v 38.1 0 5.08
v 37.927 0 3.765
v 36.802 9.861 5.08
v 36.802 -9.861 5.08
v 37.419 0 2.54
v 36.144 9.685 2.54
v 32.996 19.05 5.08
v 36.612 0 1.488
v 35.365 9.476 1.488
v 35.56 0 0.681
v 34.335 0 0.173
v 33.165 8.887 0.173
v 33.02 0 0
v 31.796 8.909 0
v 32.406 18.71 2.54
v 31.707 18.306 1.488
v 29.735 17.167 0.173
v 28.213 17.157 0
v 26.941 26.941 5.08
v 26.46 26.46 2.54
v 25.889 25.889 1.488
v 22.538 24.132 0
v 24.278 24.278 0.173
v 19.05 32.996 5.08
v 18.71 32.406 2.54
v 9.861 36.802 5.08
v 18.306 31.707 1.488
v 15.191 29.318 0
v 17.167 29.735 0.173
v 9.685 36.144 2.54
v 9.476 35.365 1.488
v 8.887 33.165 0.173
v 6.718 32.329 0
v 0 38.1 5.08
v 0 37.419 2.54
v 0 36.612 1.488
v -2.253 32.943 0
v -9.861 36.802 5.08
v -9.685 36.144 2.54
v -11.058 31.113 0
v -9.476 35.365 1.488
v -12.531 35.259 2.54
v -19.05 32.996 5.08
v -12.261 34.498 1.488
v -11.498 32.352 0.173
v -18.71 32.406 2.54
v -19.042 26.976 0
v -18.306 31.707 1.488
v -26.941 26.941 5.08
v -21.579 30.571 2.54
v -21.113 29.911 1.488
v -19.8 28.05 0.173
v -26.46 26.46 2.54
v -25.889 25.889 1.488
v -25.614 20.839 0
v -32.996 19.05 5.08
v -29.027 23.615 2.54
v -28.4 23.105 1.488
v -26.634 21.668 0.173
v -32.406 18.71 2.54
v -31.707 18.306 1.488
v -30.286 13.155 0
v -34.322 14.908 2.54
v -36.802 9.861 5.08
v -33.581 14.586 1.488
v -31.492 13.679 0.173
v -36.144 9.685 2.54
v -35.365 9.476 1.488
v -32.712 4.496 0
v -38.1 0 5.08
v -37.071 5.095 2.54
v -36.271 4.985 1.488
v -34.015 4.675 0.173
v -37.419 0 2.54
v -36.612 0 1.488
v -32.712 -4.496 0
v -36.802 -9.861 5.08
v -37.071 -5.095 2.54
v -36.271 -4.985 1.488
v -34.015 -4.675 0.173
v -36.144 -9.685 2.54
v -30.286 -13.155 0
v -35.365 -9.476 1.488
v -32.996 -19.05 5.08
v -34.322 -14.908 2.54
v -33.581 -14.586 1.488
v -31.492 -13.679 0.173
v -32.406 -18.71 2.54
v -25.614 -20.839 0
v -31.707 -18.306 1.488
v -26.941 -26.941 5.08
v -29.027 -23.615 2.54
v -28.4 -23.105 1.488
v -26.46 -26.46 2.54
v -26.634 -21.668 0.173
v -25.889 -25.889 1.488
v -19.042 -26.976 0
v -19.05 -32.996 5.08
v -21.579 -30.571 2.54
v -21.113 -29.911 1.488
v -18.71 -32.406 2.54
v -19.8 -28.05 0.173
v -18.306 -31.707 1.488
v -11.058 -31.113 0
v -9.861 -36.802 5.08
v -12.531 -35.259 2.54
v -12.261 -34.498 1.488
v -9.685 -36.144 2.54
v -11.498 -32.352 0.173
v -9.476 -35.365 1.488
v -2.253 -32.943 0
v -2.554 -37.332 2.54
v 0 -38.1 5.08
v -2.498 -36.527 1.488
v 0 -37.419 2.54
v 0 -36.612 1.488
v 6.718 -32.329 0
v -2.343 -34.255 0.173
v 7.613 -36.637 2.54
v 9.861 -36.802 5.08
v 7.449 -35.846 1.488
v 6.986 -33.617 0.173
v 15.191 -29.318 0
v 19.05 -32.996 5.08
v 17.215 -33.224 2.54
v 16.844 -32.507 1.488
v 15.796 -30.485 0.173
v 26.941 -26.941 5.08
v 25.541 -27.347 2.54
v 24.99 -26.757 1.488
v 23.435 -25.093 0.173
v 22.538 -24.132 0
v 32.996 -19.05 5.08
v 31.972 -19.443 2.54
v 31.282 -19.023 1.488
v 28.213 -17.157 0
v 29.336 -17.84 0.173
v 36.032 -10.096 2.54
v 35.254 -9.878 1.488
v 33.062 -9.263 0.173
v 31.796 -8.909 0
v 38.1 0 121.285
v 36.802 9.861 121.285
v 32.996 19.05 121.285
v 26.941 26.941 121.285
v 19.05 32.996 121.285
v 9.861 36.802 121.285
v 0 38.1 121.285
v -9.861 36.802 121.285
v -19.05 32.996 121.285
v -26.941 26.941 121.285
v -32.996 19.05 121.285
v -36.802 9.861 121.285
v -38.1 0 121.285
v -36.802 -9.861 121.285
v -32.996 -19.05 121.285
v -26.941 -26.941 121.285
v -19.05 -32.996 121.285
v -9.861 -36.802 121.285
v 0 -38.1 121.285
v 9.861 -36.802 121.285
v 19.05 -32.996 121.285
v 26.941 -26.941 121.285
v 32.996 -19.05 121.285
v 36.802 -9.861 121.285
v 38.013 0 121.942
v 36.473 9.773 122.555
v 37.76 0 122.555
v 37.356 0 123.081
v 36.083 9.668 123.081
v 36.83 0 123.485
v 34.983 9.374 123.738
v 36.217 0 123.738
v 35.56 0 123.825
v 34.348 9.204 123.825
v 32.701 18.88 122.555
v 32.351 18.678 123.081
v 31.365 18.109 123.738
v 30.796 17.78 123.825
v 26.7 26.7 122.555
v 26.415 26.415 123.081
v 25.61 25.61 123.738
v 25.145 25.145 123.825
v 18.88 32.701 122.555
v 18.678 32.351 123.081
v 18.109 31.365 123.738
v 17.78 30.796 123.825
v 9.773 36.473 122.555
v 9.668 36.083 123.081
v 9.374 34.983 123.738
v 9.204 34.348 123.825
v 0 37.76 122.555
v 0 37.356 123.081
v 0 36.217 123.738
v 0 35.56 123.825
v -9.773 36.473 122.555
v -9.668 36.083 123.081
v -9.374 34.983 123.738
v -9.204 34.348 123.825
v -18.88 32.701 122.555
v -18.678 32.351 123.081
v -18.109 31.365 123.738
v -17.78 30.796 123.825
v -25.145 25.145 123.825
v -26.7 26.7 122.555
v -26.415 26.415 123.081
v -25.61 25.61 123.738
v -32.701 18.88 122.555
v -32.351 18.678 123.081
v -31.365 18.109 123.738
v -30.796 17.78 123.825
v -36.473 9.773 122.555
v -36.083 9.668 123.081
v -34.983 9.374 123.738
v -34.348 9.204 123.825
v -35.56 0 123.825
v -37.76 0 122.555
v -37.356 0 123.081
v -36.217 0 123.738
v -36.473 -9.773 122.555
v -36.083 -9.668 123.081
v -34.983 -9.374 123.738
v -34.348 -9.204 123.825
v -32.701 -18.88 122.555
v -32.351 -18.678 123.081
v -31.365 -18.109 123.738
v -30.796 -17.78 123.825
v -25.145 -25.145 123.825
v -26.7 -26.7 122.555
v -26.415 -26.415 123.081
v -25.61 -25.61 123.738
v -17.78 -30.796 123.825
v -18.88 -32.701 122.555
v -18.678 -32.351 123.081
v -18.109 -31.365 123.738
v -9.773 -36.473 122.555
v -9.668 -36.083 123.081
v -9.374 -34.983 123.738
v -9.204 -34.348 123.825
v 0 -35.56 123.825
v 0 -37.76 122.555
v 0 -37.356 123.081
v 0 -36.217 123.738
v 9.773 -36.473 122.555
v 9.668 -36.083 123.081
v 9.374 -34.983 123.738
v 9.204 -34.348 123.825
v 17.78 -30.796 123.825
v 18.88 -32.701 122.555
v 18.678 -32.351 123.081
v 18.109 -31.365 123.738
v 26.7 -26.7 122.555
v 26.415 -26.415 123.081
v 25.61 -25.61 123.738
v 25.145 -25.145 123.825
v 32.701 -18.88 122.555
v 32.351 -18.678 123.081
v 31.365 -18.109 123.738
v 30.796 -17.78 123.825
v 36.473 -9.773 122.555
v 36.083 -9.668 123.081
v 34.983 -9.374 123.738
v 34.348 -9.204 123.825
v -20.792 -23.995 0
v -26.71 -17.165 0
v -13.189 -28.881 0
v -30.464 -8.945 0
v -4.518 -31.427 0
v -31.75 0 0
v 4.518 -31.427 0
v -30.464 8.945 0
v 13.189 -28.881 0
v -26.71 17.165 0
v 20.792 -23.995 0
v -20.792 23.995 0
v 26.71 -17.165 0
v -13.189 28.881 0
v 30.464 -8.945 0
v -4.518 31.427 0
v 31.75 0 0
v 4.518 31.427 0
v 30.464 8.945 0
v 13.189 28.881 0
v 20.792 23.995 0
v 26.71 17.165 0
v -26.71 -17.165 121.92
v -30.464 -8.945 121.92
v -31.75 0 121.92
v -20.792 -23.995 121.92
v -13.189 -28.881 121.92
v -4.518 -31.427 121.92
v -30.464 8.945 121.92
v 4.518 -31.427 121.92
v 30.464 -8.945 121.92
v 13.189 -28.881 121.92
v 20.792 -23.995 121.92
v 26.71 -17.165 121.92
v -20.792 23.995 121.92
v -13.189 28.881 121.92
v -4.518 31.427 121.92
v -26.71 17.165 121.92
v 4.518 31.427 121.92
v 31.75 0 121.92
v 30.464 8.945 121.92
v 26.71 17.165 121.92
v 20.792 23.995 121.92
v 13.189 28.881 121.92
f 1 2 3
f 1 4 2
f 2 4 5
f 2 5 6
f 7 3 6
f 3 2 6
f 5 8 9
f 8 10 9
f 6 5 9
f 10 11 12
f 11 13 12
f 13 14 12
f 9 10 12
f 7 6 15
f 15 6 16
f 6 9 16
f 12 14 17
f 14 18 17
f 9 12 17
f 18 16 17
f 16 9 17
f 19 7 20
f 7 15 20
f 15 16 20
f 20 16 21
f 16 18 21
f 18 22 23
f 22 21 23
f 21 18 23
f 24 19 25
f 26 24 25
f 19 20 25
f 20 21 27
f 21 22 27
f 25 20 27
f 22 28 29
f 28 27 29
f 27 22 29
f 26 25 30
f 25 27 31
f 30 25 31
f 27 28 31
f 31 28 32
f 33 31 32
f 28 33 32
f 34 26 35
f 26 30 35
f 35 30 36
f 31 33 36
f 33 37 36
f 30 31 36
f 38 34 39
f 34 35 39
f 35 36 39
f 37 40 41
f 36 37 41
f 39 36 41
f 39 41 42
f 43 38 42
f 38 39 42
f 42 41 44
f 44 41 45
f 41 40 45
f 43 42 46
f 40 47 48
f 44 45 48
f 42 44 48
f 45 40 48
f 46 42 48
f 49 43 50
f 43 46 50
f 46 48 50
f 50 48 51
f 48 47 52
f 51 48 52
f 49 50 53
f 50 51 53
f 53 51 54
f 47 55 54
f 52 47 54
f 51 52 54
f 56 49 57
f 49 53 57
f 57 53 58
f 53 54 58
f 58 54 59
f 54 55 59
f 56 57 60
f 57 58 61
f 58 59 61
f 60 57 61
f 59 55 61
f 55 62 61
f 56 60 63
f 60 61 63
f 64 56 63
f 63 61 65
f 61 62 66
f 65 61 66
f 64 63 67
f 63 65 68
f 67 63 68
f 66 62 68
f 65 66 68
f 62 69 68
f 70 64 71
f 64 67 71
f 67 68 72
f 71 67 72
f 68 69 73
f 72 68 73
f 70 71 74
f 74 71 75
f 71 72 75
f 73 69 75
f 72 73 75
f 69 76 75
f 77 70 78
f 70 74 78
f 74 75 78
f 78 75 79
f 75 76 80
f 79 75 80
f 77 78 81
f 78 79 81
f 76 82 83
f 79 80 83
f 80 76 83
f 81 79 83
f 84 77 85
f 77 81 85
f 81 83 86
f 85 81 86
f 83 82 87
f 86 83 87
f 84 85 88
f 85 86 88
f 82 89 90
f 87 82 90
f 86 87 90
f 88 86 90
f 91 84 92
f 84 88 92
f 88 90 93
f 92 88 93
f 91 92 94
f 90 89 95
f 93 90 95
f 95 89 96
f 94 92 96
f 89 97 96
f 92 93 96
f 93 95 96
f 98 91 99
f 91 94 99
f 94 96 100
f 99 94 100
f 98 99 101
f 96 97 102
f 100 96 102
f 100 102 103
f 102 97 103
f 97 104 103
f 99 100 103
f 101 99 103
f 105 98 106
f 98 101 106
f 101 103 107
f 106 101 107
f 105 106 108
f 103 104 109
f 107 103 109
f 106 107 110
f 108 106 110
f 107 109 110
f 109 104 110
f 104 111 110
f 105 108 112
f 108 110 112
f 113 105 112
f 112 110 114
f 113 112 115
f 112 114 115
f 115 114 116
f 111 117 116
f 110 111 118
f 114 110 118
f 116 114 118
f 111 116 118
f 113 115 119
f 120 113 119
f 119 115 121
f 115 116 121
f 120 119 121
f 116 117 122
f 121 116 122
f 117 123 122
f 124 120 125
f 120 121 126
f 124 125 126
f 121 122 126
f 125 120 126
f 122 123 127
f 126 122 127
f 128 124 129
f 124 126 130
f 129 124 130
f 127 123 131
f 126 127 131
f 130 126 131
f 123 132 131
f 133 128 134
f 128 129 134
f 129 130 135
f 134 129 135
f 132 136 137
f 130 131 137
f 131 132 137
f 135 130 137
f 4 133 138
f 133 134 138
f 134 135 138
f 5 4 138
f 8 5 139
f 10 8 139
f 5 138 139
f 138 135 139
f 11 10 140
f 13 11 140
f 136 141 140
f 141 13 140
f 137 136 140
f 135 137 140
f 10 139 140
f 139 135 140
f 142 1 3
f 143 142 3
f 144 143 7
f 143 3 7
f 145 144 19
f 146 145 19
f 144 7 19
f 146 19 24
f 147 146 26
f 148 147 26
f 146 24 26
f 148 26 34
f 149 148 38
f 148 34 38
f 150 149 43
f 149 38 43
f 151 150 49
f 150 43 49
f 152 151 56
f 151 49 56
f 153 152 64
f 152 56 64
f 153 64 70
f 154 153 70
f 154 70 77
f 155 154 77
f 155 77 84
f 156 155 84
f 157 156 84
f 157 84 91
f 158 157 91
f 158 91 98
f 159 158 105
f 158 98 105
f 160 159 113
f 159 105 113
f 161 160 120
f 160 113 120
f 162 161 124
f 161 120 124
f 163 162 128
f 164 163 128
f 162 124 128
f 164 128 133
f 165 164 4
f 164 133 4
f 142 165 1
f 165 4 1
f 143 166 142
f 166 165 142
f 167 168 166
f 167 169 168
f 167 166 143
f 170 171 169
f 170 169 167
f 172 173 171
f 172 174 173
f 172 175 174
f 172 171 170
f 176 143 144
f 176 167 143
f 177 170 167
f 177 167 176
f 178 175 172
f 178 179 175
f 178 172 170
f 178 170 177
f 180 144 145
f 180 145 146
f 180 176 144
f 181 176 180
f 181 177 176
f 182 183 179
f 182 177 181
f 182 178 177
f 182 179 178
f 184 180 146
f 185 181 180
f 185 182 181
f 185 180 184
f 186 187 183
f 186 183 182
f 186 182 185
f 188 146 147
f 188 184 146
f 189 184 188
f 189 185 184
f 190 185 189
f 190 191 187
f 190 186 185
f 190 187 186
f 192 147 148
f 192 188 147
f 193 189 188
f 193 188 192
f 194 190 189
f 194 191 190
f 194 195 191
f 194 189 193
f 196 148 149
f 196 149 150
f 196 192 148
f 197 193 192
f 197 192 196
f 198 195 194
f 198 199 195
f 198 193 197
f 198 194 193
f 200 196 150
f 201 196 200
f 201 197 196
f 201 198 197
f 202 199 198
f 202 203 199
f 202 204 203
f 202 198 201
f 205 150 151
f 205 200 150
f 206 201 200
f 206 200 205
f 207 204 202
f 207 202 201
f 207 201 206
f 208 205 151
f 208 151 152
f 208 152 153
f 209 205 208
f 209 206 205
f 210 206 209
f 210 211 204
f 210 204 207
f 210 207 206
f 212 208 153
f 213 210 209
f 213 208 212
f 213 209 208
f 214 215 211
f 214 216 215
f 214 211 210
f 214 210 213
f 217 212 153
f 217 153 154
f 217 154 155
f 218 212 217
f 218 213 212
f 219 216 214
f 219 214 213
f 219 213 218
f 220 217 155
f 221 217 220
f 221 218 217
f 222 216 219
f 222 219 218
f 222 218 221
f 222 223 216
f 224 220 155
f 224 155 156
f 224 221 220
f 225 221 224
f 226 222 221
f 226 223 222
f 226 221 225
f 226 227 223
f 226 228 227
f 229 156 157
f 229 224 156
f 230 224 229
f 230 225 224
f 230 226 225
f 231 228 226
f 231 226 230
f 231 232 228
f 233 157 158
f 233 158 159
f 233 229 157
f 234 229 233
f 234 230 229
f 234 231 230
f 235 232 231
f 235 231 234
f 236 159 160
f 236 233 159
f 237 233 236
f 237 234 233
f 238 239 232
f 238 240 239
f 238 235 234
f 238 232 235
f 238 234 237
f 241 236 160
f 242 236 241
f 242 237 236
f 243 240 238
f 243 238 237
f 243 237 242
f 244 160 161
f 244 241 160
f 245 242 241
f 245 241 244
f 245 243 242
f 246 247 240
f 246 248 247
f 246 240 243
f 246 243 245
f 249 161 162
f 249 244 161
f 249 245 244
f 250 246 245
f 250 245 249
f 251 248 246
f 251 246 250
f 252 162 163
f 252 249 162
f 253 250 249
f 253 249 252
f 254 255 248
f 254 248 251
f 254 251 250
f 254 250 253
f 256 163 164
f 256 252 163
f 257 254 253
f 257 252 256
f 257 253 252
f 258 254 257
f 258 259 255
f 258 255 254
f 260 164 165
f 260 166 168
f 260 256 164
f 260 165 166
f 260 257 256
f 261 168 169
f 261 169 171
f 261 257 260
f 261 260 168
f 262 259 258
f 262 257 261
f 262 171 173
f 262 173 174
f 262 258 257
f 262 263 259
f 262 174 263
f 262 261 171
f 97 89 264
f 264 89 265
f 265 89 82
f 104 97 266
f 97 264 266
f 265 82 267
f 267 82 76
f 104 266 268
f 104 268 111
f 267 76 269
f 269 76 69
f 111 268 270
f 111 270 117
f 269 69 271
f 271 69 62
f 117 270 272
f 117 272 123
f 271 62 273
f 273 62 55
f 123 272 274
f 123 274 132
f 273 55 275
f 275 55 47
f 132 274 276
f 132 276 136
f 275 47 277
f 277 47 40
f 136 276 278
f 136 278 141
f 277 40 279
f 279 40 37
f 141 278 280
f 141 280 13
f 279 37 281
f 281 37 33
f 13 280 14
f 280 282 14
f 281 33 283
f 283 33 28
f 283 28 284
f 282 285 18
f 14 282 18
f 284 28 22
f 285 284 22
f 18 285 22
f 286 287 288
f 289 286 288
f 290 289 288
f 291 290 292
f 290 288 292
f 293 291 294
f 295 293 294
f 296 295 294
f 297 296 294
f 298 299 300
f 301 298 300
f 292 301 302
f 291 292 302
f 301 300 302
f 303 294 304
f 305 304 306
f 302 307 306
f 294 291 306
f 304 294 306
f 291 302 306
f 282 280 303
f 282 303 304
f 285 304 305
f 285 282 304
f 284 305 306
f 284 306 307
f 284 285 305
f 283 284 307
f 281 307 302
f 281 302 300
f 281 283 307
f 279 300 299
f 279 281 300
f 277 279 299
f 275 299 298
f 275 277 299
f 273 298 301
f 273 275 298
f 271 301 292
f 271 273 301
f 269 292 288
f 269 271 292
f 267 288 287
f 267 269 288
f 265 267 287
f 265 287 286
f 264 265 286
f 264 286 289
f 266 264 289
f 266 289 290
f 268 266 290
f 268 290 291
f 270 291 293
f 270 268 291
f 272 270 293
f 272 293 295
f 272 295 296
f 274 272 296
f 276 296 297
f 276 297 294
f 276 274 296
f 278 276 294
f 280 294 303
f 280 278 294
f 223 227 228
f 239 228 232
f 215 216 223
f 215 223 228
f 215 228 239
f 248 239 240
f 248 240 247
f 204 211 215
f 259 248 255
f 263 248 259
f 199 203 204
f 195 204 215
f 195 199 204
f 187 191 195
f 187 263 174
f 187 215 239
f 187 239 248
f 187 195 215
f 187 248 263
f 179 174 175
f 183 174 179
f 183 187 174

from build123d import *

# Parameters (mm, degrees)
F0_R     = 38.1
F2_DEPTH = 123.825
F1_R     = 31.75
F3_DEPTH = 121.92
F4_R     = 5.08
F5_R     = 2.54


with BuildPart() as f2:
    # F0 (on Top) → F2 (new body)
    with BuildSketch(Plane.XY):
        Circle(F0_R)
    extrude(amount=F2_DEPTH)

    # F1 (on Top) → F3 (cut)
    with BuildSketch(Plane.XY):
        Circle(F1_R)
    extrude(amount=F3_DEPTH, mode=Mode.SUBTRACT)

    # F4
    f4_edges = [f2.edges().sort_by_distance(p)[0] for p in [
        (-38.1, 0, 0),
    ]]
    fillet(f4_edges, radius=F4_R)

    # F5
    f5_edges = [f2.edges().sort_by_distance(p)[0] for p in [
        (-38.1, 0, 123.825),
    ]]
    fillet(f5_edges, radius=F5_R)


solid = f2.part
